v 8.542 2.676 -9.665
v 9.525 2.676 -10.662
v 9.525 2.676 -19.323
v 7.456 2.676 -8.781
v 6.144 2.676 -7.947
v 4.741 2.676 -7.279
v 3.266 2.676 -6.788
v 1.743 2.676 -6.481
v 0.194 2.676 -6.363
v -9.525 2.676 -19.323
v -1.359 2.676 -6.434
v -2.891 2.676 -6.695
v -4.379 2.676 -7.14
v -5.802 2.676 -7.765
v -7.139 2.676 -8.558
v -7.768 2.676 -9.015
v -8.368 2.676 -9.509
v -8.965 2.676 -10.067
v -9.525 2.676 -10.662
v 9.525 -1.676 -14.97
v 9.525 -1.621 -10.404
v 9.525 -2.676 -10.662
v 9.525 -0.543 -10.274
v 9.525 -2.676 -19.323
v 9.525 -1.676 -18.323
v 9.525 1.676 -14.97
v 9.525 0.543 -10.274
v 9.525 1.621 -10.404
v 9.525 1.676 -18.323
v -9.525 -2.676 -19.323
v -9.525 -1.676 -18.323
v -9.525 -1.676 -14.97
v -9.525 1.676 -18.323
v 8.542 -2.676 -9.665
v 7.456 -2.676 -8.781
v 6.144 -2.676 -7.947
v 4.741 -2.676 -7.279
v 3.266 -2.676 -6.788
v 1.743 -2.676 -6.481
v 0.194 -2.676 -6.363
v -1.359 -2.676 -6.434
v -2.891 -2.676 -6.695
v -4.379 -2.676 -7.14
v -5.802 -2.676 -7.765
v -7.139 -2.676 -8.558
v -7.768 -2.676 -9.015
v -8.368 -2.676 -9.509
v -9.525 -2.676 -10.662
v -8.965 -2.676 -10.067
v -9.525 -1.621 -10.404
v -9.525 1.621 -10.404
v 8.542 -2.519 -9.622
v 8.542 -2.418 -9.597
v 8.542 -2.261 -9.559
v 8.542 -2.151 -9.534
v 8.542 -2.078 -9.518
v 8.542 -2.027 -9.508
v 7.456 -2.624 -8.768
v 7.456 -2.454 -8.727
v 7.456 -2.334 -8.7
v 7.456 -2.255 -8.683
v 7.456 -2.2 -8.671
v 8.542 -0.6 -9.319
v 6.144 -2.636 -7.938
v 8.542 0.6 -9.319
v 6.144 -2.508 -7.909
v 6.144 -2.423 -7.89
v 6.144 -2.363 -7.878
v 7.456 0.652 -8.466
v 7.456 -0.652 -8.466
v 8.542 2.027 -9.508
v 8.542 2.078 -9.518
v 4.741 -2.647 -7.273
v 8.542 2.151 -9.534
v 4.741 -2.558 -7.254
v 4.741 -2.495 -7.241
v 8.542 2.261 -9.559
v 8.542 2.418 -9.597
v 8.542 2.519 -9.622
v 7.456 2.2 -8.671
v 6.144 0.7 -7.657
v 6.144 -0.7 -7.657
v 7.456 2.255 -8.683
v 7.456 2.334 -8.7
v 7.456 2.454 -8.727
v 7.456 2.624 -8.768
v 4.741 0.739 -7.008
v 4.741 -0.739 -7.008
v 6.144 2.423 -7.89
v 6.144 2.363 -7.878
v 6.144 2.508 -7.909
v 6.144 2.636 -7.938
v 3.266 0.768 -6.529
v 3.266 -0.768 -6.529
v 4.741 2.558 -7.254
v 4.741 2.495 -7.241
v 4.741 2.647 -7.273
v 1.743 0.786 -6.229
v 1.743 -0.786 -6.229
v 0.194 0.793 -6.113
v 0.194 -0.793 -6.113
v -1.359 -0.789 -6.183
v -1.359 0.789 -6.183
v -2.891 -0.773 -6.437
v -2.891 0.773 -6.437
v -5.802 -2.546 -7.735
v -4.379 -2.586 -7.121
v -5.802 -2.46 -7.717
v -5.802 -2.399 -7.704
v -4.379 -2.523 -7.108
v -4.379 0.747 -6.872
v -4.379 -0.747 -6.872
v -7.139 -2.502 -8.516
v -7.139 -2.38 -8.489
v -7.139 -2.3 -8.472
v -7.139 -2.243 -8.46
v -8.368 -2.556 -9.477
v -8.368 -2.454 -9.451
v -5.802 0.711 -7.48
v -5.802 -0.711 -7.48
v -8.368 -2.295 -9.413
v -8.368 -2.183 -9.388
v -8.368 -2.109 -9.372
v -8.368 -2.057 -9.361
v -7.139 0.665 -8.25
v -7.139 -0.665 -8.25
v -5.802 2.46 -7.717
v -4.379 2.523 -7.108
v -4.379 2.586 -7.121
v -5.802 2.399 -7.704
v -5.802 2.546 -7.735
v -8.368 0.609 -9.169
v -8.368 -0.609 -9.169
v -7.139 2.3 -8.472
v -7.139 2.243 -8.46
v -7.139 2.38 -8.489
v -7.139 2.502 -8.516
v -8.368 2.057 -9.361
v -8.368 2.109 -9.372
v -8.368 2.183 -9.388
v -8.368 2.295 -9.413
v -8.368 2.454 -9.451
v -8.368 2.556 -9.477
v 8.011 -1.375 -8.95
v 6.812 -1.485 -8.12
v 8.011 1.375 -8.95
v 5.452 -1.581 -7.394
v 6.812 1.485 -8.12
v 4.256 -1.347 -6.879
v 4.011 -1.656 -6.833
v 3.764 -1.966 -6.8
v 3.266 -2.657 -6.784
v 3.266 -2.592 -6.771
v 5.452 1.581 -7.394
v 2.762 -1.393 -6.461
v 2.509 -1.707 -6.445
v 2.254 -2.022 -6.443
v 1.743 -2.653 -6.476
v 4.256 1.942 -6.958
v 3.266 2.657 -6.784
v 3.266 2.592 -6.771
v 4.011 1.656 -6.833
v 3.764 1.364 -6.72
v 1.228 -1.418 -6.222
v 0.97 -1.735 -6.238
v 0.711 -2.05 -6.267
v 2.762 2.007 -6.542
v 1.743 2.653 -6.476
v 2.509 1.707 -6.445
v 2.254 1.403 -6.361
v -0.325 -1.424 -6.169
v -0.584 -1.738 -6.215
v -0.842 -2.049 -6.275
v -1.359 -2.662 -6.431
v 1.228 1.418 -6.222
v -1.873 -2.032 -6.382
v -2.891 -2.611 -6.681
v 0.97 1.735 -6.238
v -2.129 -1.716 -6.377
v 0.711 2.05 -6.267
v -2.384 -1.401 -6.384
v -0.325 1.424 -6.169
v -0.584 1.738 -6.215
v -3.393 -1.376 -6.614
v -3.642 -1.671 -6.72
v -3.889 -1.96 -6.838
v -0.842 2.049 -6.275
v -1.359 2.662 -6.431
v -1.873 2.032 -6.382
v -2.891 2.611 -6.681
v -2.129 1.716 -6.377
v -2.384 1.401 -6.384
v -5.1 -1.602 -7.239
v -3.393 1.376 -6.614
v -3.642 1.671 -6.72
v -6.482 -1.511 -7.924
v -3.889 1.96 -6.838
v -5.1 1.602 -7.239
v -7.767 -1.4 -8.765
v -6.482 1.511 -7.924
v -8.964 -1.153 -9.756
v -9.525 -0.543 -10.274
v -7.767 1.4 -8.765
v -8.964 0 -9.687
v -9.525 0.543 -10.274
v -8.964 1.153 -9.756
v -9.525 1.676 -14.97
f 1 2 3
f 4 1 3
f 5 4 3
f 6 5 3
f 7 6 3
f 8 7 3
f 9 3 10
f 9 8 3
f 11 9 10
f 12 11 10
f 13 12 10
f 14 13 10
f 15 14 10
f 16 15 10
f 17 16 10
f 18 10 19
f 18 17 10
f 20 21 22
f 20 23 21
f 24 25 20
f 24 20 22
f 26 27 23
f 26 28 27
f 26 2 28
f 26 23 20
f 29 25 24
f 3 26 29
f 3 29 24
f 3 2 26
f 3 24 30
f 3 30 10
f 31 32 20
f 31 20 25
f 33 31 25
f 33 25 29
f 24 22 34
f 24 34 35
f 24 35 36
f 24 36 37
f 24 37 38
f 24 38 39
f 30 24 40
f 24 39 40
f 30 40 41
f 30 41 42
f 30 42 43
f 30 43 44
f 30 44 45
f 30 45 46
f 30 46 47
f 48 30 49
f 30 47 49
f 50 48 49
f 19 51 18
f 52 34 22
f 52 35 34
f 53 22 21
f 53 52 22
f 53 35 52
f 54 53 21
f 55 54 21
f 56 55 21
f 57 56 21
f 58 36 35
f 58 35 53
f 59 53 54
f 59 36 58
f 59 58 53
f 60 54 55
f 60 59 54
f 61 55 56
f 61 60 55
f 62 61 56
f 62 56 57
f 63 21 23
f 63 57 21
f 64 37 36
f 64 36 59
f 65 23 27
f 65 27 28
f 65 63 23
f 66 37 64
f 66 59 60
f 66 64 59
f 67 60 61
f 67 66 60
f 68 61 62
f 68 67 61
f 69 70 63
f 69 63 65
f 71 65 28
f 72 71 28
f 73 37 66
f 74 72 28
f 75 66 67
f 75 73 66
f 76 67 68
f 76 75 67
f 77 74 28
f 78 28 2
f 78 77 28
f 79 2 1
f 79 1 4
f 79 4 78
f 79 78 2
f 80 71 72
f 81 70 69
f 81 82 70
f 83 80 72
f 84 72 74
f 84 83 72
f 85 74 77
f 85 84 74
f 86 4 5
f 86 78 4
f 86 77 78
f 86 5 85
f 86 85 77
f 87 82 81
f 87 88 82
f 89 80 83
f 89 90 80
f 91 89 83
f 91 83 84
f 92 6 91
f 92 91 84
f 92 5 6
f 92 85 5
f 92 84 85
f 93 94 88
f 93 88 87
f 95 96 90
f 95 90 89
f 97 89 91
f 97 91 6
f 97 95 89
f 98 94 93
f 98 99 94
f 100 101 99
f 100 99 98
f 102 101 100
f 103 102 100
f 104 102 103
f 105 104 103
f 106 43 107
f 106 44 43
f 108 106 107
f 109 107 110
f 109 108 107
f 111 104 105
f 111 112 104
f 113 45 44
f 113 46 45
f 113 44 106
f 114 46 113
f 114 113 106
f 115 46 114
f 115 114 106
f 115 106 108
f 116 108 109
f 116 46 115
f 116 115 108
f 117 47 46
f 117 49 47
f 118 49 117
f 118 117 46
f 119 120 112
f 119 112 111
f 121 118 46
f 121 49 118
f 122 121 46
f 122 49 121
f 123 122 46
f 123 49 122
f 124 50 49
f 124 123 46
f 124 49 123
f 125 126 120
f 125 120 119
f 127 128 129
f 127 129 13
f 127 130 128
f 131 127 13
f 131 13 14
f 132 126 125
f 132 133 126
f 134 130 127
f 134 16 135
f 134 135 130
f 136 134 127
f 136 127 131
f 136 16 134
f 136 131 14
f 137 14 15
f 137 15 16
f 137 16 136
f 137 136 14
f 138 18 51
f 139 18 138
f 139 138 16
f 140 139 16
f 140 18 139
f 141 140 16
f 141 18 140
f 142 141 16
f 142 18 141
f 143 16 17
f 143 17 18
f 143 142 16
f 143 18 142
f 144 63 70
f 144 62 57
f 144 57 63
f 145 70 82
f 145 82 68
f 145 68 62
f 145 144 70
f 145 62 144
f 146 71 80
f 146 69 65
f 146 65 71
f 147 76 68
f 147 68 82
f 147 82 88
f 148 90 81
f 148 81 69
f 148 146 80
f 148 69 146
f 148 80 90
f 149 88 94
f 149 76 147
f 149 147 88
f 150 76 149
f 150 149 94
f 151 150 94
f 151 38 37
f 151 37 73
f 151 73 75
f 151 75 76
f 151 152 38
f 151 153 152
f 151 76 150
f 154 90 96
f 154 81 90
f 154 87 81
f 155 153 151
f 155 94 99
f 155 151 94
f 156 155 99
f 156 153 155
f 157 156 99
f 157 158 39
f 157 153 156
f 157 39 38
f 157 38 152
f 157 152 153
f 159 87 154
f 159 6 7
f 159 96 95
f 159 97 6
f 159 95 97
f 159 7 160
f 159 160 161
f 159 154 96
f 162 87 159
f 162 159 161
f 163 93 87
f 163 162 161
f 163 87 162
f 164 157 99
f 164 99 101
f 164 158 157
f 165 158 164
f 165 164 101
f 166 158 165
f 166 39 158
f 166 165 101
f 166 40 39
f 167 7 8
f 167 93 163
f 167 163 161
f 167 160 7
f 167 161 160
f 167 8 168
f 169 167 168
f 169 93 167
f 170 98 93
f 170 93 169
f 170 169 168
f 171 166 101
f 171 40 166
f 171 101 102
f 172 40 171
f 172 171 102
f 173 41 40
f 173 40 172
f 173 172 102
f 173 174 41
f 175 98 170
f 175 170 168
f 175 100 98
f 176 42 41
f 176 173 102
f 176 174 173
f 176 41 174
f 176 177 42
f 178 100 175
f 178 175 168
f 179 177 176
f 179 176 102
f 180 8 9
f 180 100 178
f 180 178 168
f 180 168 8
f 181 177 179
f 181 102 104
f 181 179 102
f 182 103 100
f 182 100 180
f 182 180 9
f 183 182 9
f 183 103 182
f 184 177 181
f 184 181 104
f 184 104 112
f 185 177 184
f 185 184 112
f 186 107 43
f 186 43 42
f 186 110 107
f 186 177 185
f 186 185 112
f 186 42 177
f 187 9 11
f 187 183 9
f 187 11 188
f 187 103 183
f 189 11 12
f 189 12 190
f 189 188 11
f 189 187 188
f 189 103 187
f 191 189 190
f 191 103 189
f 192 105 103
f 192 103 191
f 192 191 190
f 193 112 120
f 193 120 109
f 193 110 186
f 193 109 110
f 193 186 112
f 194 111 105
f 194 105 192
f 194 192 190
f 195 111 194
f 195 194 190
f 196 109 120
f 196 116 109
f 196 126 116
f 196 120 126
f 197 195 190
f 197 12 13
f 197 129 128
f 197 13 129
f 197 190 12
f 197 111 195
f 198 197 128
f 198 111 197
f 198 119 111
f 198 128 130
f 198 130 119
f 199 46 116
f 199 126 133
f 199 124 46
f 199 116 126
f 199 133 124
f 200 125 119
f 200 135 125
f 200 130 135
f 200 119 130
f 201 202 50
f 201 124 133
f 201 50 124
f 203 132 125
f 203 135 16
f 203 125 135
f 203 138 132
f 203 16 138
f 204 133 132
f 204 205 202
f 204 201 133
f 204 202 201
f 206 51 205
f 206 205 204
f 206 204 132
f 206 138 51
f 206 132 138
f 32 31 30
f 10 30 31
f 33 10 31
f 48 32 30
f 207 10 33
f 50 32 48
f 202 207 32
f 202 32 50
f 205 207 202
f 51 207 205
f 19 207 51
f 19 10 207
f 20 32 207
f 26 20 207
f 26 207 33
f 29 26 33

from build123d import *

# Parameters (mm, degrees)
SKETCH1_W           = 5.3528
SKETCH1_H           = 5.3528
SKETCH1_W_2         = 3.3528
SKETCH1_H_2         = 3.3528
BOSS_EXTRUDE1_DEPTH = 9.525
BOSS_EXTRUDE2_START = -5.3528
BOSS_EXTRUDE2_DEPTH = 5.3528


with BuildPart() as part:
    # Sketch1 → Boss-Extrude1 (new, symmetric)
    with BuildSketch(Plane(origin=(0, 0, 0), x_dir=(0, 0, -1), z_dir=(1, 0, 0))):
        with Locations((16.646784182, 0)):
            Rectangle(SKETCH1_W, SKETCH1_H)
        with Locations((16.646784182, 0)):
            Rectangle(SKETCH1_W_2, SKETCH1_H_2, mode=Mode.SUBTRACT)
    extrude(amount=BOSS_EXTRUDE1_DEPTH, both=True)

    # Sketch2 → Boss-Extrude2 (add)
    with BuildSketch(Plane.XZ.offset(2.6764).offset(BOSS_EXTRUDE2_START)):
        with BuildLine():
            Line((-9.525, -13.970384182), (-9.525, -10.258084471))
            ThreePointArc((-9.525, -10.258084471), (0, -6.087615818), (9.525, -10.258084471))
            Line((9.525, -10.258084471), (9.525, -13.970384182))
            Line((9.525, -13.970384182), (-9.525, -13.970384182))
        make_face()
    extrude(amount=BOSS_EXTRUDE2_DEPTH)

    # Sketch3 → Cut-Revolve1 (revolve, cut)
    with BuildSketch(Plane(origin=(0, 0, 0), x_dir=(1, 0, 0), z_dir=(0, 1, 0))):
        with BuildLine():
            Line((-9.525, 10.258084471), (-9.525, -8.791915529))
            Line((-9.525, -8.791915529), (9.525, -8.791915529))
            Line((9.525, -8.791915529), (9.525, 10.258084471))
            ThreePointArc((9.525, 10.258084471), (0, 6.087615818), (-9.525, 10.258084471))
        make_face()
    revolve(axis=Axis((9.525, 0, -19.323184182), (-1, 0, 0)), mode=Mode.SUBTRACT)


solid = part.part
